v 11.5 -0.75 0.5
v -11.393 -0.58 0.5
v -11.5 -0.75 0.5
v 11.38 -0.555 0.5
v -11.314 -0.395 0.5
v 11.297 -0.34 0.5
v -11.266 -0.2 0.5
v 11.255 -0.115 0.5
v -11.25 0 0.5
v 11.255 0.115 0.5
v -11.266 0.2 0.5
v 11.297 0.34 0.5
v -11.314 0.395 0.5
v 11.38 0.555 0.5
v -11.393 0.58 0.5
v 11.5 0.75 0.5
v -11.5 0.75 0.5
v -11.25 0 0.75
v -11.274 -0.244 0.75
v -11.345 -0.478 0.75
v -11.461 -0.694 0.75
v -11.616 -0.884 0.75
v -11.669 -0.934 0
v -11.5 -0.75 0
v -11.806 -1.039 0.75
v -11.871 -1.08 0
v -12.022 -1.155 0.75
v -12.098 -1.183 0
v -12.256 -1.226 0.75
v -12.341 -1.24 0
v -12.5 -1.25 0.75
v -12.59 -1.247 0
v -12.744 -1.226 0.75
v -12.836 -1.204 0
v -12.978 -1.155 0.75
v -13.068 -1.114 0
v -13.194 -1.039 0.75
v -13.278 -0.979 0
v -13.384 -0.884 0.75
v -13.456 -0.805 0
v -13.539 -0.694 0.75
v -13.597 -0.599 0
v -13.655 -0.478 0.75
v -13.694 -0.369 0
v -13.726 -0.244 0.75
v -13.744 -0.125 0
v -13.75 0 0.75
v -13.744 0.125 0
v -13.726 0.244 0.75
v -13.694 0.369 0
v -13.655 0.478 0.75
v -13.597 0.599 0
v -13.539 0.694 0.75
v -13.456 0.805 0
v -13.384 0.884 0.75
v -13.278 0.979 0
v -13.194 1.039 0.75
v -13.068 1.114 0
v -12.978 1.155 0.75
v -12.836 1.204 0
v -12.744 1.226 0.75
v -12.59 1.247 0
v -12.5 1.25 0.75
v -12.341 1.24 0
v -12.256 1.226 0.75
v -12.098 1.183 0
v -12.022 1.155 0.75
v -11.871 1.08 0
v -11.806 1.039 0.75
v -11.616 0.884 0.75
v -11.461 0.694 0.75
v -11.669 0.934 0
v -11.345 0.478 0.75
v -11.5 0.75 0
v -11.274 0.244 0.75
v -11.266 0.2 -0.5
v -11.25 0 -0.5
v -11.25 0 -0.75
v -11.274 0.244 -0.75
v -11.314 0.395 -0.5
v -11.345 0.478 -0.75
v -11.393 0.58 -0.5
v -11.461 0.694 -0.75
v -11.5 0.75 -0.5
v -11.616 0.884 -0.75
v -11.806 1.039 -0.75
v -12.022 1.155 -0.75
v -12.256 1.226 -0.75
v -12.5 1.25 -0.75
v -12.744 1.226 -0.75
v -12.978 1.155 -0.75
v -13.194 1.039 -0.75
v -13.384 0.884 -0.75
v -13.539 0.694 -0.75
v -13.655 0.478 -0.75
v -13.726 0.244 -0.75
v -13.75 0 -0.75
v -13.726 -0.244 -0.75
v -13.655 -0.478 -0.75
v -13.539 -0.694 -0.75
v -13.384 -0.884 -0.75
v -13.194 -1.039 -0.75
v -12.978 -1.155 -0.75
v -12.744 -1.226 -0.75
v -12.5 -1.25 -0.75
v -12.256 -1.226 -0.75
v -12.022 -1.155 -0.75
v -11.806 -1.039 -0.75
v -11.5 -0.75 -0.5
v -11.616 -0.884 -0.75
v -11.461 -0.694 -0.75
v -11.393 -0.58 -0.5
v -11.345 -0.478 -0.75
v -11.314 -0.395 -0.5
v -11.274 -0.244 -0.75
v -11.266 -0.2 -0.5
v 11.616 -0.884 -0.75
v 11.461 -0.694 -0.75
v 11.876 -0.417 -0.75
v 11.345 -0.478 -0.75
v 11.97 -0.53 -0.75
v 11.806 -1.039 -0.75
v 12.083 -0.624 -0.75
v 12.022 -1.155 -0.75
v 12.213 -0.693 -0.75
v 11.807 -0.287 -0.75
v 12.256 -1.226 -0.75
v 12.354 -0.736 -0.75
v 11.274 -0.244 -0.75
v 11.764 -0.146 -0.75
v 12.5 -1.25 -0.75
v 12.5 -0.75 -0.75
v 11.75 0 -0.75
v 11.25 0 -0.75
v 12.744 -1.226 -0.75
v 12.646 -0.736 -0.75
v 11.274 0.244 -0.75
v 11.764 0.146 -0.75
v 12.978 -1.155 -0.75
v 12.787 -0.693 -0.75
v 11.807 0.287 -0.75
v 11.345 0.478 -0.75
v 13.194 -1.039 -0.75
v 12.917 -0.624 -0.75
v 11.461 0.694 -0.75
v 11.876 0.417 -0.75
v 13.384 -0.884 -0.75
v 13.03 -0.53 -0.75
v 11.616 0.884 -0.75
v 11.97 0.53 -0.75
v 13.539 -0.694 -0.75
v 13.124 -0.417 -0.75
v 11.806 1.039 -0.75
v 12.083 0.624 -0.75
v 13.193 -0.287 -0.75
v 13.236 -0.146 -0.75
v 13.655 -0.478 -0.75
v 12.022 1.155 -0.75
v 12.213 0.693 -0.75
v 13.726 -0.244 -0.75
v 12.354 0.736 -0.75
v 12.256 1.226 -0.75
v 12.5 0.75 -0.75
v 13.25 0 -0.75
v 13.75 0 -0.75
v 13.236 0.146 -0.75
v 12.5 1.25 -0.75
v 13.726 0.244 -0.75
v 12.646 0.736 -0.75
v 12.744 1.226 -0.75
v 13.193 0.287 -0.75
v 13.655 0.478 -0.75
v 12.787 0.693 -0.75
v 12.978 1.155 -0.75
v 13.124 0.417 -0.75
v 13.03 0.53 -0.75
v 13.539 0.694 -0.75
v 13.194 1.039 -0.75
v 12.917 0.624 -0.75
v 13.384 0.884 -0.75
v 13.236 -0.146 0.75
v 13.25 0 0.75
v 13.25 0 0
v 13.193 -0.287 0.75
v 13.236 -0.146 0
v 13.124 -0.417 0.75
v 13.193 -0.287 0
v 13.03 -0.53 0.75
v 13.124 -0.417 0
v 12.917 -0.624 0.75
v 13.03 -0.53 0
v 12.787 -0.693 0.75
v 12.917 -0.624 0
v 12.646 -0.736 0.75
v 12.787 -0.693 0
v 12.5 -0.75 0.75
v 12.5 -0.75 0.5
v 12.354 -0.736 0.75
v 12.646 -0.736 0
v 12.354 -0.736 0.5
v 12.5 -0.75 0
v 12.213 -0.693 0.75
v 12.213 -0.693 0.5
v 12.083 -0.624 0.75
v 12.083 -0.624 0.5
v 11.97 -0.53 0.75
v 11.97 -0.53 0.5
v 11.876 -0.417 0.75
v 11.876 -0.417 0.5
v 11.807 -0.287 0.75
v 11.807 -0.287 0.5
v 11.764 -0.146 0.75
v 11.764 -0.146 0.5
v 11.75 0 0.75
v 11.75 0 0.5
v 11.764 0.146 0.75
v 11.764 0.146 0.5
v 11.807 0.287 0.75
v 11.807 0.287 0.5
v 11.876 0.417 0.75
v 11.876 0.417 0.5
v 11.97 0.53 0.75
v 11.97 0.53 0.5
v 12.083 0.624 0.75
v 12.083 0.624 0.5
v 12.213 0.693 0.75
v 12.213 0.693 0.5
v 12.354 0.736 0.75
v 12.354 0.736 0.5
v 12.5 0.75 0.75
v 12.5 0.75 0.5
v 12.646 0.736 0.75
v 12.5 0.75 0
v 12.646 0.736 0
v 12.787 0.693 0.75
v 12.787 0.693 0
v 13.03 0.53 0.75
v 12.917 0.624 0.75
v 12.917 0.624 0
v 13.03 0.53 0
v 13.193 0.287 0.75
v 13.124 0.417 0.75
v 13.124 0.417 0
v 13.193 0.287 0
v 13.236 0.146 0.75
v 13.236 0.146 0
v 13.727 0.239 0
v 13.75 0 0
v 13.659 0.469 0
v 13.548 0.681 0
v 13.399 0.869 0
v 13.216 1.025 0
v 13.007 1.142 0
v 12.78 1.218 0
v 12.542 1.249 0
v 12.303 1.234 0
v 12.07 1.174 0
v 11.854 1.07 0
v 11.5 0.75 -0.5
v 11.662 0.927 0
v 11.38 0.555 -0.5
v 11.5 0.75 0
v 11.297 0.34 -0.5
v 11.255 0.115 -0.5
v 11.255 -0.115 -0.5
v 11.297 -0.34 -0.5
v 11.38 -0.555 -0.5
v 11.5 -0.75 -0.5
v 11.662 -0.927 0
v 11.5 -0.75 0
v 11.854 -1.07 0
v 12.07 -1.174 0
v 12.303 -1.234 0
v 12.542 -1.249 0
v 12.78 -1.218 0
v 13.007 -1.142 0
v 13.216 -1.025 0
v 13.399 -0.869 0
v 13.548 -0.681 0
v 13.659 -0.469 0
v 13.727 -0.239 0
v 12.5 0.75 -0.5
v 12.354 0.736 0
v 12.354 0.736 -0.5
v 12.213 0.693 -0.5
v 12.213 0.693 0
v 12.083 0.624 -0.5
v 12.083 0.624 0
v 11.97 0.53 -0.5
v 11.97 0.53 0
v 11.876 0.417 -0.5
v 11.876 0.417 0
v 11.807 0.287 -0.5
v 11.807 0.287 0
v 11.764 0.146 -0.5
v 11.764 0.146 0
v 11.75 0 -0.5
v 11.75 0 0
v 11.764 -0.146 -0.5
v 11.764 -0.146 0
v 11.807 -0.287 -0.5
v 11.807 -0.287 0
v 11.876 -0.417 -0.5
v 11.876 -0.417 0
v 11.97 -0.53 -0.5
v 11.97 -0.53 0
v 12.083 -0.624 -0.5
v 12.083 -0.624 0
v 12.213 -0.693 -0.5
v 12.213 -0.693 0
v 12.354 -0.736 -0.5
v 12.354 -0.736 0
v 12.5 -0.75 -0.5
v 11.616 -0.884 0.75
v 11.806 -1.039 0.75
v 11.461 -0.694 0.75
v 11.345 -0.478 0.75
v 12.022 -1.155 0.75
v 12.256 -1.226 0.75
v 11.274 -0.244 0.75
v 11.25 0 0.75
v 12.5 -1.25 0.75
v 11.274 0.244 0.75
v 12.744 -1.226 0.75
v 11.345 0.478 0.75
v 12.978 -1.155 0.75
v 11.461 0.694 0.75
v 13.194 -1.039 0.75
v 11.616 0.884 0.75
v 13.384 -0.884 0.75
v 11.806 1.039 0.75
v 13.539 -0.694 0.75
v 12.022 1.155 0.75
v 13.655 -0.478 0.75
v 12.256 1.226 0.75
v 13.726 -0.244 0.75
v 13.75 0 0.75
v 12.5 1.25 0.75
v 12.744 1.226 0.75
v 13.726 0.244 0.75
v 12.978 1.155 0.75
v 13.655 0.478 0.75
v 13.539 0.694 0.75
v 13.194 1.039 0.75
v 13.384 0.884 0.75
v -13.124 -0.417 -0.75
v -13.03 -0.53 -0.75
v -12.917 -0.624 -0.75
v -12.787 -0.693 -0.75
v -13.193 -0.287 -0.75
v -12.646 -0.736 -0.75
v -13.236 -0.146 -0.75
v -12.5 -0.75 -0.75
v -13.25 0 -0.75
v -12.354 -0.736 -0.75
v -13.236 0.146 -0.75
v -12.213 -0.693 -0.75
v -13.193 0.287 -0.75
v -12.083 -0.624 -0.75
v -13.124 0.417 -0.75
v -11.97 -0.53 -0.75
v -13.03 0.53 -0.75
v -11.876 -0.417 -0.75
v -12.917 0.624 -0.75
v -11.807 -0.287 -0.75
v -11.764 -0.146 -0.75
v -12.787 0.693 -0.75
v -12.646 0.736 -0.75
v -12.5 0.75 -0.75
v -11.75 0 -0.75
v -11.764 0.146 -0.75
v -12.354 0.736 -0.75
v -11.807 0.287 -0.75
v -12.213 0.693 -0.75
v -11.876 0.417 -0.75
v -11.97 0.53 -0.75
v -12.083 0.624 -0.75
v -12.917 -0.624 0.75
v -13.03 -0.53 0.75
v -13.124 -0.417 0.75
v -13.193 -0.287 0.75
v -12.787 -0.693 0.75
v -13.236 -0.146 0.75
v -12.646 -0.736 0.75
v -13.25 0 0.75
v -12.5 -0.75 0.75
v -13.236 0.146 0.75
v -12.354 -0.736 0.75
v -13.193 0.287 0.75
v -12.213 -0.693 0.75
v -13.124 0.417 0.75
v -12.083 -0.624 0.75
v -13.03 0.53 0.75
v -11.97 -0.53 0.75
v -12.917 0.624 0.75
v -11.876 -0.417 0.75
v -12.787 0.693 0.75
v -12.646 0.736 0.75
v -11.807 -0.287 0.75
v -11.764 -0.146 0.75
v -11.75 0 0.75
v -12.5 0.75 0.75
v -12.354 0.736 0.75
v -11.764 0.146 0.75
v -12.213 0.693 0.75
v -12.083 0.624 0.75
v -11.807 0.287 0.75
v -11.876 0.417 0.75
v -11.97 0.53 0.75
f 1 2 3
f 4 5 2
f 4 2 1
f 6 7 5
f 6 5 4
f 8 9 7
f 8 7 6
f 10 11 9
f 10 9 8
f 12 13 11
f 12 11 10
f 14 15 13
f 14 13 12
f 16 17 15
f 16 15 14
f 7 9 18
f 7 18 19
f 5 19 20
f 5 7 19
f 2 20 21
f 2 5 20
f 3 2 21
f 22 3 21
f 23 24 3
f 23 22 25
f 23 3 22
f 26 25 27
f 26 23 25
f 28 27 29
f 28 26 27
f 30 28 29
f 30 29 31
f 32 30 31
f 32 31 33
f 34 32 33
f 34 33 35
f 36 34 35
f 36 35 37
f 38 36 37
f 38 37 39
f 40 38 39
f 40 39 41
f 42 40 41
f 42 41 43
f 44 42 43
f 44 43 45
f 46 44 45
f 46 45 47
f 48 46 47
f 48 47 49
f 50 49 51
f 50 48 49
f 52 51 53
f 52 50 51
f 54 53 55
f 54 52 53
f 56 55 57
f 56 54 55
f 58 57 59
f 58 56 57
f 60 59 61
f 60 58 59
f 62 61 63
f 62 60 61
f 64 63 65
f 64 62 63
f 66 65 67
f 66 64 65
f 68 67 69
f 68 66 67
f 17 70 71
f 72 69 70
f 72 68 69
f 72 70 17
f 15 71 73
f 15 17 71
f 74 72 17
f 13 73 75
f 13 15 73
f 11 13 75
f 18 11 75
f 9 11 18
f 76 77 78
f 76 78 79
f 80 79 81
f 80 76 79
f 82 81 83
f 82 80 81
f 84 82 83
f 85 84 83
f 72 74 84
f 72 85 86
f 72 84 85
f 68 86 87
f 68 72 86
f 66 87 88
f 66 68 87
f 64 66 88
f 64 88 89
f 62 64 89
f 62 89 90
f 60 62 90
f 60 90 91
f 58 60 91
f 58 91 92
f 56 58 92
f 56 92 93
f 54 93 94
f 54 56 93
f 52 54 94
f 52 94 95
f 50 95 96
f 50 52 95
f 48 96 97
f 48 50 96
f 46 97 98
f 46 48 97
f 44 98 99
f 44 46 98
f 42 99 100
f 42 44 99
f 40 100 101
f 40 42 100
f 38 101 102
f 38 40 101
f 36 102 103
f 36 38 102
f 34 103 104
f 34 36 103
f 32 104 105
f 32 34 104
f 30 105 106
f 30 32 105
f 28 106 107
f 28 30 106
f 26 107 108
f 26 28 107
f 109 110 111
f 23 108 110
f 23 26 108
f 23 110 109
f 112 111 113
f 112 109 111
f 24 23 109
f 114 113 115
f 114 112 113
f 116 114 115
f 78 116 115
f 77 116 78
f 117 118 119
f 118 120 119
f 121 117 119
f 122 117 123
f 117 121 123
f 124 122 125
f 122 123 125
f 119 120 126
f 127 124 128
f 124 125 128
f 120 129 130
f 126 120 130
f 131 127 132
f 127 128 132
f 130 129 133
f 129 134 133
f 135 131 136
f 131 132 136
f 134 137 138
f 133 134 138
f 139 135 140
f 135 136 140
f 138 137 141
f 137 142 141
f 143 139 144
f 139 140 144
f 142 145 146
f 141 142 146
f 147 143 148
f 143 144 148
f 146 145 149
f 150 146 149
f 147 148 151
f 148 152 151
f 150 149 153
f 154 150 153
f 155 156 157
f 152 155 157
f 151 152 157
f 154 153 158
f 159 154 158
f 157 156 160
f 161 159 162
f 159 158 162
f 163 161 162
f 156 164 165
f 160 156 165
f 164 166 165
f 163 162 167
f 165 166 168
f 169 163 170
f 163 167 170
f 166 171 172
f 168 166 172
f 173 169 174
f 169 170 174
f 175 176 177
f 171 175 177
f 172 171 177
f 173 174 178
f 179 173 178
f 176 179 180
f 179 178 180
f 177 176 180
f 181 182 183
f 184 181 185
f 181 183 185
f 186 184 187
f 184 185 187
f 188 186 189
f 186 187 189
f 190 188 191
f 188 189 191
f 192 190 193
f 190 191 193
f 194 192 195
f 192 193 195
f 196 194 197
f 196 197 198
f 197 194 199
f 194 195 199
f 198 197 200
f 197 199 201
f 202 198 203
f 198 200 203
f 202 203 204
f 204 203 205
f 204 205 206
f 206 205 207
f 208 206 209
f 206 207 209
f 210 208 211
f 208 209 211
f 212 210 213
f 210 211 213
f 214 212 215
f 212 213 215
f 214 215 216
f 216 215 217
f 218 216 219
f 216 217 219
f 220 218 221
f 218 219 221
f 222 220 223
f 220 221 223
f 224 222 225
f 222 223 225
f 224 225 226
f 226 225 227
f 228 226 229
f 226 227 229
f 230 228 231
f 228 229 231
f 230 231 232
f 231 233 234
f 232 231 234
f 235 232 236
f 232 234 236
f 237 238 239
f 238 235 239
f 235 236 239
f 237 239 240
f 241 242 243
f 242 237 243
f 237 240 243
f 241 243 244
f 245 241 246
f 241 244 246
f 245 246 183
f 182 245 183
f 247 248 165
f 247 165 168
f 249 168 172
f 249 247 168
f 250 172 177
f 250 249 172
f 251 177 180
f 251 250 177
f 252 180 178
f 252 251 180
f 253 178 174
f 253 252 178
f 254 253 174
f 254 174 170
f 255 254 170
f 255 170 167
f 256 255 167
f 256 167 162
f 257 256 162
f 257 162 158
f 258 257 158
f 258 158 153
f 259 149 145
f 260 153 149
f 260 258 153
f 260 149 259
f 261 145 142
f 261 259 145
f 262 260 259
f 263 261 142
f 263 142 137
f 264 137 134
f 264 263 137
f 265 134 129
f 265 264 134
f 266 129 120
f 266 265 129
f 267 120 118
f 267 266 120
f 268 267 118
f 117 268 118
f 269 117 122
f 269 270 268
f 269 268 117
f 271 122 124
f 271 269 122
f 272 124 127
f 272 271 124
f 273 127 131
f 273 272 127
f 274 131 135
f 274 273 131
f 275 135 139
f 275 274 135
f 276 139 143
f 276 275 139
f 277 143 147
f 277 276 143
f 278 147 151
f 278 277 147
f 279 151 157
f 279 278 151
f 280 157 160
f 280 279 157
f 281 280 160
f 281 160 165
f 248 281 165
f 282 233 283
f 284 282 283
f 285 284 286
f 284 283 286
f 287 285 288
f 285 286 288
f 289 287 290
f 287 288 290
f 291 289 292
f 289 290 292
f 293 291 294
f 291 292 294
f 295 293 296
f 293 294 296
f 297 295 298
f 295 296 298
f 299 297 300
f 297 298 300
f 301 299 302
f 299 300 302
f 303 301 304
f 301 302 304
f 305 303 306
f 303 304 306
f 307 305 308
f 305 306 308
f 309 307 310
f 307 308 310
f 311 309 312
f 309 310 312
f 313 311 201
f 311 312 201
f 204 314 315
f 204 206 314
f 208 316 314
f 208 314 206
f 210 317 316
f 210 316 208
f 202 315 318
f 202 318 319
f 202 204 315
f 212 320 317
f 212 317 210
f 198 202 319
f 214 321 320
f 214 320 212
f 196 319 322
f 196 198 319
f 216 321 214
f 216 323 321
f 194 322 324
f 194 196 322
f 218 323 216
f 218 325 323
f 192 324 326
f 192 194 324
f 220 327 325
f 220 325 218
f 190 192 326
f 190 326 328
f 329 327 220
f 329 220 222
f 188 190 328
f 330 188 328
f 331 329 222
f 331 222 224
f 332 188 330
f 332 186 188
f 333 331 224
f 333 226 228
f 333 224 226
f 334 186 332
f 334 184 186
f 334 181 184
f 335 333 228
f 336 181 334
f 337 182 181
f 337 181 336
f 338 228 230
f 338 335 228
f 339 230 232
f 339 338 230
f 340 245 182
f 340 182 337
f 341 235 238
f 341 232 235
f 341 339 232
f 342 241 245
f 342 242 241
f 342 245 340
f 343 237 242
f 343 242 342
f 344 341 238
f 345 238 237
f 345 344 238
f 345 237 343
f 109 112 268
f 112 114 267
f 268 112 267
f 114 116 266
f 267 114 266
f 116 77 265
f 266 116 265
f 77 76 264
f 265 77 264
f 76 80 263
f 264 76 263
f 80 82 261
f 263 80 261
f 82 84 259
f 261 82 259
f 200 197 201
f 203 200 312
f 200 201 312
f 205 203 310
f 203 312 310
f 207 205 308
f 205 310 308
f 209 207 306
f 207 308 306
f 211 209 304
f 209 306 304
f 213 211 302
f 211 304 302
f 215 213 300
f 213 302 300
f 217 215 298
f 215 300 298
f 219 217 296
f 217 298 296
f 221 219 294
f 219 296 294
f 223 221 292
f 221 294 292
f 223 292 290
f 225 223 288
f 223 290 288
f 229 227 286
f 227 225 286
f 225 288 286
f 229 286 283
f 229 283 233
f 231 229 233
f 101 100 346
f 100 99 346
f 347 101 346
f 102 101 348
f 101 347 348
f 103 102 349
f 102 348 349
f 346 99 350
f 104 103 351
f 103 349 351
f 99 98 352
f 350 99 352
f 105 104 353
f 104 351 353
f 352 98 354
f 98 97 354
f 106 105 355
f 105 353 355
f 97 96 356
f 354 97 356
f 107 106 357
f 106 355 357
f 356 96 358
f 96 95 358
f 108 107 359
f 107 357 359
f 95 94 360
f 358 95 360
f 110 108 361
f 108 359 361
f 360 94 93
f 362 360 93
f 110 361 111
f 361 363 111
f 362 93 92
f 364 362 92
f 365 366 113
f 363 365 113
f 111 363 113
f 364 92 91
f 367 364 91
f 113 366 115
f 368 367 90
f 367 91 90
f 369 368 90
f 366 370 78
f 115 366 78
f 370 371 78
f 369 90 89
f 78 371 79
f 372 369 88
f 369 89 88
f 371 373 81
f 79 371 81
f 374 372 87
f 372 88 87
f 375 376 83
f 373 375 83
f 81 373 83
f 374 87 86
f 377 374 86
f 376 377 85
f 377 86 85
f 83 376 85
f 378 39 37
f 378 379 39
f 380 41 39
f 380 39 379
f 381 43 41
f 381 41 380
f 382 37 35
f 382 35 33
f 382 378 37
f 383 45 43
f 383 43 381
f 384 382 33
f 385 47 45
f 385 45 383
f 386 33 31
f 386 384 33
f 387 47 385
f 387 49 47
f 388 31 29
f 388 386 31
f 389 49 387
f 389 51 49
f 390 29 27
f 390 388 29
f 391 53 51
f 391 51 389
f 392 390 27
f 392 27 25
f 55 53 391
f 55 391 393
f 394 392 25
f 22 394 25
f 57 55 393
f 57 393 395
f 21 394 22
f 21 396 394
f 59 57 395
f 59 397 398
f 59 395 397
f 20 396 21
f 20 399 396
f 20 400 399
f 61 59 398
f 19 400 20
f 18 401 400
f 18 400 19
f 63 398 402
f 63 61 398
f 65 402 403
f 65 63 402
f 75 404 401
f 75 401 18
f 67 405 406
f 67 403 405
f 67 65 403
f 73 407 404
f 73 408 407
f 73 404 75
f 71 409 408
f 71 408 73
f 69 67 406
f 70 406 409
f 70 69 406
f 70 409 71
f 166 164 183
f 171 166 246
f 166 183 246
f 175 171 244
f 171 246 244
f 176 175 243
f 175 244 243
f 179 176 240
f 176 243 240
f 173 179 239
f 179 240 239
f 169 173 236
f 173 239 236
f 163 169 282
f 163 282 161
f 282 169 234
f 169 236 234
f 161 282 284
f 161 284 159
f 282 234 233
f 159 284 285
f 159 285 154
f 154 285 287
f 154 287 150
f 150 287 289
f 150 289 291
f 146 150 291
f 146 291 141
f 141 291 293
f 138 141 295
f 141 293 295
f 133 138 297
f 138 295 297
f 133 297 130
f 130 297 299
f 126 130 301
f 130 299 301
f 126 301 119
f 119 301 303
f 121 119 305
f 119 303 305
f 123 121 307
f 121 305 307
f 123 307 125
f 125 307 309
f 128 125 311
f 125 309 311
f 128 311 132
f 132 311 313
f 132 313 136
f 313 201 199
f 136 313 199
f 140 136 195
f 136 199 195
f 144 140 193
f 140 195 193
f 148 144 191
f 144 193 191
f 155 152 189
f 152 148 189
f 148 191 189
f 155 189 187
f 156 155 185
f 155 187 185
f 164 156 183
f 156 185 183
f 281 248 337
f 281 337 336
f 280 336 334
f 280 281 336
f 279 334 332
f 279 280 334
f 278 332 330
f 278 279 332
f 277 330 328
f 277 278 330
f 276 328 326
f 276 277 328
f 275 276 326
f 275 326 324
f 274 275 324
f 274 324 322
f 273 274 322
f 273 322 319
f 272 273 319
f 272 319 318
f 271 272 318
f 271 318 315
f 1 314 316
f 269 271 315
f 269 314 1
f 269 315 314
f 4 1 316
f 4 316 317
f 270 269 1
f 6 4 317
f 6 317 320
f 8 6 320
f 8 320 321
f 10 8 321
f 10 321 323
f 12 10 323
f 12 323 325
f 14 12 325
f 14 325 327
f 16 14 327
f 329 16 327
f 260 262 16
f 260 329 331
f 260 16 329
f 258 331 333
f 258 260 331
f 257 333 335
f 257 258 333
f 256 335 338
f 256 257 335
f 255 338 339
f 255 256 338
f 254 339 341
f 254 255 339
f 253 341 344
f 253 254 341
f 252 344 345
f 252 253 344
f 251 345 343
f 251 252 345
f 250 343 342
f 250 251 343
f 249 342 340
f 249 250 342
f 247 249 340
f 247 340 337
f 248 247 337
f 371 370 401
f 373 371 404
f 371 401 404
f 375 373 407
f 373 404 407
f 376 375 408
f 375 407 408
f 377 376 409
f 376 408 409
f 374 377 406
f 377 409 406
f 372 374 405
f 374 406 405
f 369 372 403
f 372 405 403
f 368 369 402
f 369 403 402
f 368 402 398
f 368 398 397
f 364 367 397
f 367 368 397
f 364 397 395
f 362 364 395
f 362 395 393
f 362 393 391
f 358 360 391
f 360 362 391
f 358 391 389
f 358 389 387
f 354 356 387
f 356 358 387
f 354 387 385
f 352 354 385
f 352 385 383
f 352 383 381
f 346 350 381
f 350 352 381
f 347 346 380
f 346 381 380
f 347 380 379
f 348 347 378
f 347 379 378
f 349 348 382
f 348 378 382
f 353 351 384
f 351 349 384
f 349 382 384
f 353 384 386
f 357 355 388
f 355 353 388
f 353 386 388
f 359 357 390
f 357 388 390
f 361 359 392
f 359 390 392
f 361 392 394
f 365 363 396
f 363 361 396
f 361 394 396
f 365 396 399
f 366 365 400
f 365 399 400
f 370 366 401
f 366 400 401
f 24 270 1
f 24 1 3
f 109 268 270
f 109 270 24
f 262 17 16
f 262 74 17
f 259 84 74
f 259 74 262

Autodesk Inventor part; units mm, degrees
ref_plane "YZ Plane" through (0, 0, 0) normal (1, 0, 0) x (0, 1, 0)
ref_plane "XZ Plane" through (0, 0, 0) normal (0, 1, 0) x (-1, 0, 0)
ref_plane "XY Plane" through (0, 0, 0) normal (0, 0, 1) x (1, 0, 0)
sketch "Sketch4" plane through (0, 0, 0) normal (0, 0, 1) x (1, 0, 0)
  circle A0 centre (-12.5, 0) radius 0.75
  circle A1 centre (-12.5, 0) radius 1.25
  circle A2 centre (12.5, 0) radius 0.75
  circle A3 centre (12.5, 0) radius 1.25
  line L0 (-12.5, 0.75) -> (12.5, 0.75)
  line L1 (12.5, -0.75) -> (-12.5, -0.75)
  point P0 (0, 0)
  dimension "d22" = 1.5
  dimension "d23" = 2.5
  dimension "d24" = 1.5
  dimension "d25" = 2.5
extrude "Extrusion6" add sketch "Sketch4" along normal mid plane 1.5 contours A0 L0 A1 L1 | A0 L1 A1 L0 | L0 A2 L1 A3 | A3 L1 A2 L0
extrude "Extrusion7" add sketch "Sketch4" along normal mid plane 1 contours A0 L0 A1 L1 | L0 A3 L1 A1 | L0 A2 L1 A3 picked at (-11.4262, -0.0887) picked at (11.582, -0.5653)
properties part number "Shaft_Piston"
